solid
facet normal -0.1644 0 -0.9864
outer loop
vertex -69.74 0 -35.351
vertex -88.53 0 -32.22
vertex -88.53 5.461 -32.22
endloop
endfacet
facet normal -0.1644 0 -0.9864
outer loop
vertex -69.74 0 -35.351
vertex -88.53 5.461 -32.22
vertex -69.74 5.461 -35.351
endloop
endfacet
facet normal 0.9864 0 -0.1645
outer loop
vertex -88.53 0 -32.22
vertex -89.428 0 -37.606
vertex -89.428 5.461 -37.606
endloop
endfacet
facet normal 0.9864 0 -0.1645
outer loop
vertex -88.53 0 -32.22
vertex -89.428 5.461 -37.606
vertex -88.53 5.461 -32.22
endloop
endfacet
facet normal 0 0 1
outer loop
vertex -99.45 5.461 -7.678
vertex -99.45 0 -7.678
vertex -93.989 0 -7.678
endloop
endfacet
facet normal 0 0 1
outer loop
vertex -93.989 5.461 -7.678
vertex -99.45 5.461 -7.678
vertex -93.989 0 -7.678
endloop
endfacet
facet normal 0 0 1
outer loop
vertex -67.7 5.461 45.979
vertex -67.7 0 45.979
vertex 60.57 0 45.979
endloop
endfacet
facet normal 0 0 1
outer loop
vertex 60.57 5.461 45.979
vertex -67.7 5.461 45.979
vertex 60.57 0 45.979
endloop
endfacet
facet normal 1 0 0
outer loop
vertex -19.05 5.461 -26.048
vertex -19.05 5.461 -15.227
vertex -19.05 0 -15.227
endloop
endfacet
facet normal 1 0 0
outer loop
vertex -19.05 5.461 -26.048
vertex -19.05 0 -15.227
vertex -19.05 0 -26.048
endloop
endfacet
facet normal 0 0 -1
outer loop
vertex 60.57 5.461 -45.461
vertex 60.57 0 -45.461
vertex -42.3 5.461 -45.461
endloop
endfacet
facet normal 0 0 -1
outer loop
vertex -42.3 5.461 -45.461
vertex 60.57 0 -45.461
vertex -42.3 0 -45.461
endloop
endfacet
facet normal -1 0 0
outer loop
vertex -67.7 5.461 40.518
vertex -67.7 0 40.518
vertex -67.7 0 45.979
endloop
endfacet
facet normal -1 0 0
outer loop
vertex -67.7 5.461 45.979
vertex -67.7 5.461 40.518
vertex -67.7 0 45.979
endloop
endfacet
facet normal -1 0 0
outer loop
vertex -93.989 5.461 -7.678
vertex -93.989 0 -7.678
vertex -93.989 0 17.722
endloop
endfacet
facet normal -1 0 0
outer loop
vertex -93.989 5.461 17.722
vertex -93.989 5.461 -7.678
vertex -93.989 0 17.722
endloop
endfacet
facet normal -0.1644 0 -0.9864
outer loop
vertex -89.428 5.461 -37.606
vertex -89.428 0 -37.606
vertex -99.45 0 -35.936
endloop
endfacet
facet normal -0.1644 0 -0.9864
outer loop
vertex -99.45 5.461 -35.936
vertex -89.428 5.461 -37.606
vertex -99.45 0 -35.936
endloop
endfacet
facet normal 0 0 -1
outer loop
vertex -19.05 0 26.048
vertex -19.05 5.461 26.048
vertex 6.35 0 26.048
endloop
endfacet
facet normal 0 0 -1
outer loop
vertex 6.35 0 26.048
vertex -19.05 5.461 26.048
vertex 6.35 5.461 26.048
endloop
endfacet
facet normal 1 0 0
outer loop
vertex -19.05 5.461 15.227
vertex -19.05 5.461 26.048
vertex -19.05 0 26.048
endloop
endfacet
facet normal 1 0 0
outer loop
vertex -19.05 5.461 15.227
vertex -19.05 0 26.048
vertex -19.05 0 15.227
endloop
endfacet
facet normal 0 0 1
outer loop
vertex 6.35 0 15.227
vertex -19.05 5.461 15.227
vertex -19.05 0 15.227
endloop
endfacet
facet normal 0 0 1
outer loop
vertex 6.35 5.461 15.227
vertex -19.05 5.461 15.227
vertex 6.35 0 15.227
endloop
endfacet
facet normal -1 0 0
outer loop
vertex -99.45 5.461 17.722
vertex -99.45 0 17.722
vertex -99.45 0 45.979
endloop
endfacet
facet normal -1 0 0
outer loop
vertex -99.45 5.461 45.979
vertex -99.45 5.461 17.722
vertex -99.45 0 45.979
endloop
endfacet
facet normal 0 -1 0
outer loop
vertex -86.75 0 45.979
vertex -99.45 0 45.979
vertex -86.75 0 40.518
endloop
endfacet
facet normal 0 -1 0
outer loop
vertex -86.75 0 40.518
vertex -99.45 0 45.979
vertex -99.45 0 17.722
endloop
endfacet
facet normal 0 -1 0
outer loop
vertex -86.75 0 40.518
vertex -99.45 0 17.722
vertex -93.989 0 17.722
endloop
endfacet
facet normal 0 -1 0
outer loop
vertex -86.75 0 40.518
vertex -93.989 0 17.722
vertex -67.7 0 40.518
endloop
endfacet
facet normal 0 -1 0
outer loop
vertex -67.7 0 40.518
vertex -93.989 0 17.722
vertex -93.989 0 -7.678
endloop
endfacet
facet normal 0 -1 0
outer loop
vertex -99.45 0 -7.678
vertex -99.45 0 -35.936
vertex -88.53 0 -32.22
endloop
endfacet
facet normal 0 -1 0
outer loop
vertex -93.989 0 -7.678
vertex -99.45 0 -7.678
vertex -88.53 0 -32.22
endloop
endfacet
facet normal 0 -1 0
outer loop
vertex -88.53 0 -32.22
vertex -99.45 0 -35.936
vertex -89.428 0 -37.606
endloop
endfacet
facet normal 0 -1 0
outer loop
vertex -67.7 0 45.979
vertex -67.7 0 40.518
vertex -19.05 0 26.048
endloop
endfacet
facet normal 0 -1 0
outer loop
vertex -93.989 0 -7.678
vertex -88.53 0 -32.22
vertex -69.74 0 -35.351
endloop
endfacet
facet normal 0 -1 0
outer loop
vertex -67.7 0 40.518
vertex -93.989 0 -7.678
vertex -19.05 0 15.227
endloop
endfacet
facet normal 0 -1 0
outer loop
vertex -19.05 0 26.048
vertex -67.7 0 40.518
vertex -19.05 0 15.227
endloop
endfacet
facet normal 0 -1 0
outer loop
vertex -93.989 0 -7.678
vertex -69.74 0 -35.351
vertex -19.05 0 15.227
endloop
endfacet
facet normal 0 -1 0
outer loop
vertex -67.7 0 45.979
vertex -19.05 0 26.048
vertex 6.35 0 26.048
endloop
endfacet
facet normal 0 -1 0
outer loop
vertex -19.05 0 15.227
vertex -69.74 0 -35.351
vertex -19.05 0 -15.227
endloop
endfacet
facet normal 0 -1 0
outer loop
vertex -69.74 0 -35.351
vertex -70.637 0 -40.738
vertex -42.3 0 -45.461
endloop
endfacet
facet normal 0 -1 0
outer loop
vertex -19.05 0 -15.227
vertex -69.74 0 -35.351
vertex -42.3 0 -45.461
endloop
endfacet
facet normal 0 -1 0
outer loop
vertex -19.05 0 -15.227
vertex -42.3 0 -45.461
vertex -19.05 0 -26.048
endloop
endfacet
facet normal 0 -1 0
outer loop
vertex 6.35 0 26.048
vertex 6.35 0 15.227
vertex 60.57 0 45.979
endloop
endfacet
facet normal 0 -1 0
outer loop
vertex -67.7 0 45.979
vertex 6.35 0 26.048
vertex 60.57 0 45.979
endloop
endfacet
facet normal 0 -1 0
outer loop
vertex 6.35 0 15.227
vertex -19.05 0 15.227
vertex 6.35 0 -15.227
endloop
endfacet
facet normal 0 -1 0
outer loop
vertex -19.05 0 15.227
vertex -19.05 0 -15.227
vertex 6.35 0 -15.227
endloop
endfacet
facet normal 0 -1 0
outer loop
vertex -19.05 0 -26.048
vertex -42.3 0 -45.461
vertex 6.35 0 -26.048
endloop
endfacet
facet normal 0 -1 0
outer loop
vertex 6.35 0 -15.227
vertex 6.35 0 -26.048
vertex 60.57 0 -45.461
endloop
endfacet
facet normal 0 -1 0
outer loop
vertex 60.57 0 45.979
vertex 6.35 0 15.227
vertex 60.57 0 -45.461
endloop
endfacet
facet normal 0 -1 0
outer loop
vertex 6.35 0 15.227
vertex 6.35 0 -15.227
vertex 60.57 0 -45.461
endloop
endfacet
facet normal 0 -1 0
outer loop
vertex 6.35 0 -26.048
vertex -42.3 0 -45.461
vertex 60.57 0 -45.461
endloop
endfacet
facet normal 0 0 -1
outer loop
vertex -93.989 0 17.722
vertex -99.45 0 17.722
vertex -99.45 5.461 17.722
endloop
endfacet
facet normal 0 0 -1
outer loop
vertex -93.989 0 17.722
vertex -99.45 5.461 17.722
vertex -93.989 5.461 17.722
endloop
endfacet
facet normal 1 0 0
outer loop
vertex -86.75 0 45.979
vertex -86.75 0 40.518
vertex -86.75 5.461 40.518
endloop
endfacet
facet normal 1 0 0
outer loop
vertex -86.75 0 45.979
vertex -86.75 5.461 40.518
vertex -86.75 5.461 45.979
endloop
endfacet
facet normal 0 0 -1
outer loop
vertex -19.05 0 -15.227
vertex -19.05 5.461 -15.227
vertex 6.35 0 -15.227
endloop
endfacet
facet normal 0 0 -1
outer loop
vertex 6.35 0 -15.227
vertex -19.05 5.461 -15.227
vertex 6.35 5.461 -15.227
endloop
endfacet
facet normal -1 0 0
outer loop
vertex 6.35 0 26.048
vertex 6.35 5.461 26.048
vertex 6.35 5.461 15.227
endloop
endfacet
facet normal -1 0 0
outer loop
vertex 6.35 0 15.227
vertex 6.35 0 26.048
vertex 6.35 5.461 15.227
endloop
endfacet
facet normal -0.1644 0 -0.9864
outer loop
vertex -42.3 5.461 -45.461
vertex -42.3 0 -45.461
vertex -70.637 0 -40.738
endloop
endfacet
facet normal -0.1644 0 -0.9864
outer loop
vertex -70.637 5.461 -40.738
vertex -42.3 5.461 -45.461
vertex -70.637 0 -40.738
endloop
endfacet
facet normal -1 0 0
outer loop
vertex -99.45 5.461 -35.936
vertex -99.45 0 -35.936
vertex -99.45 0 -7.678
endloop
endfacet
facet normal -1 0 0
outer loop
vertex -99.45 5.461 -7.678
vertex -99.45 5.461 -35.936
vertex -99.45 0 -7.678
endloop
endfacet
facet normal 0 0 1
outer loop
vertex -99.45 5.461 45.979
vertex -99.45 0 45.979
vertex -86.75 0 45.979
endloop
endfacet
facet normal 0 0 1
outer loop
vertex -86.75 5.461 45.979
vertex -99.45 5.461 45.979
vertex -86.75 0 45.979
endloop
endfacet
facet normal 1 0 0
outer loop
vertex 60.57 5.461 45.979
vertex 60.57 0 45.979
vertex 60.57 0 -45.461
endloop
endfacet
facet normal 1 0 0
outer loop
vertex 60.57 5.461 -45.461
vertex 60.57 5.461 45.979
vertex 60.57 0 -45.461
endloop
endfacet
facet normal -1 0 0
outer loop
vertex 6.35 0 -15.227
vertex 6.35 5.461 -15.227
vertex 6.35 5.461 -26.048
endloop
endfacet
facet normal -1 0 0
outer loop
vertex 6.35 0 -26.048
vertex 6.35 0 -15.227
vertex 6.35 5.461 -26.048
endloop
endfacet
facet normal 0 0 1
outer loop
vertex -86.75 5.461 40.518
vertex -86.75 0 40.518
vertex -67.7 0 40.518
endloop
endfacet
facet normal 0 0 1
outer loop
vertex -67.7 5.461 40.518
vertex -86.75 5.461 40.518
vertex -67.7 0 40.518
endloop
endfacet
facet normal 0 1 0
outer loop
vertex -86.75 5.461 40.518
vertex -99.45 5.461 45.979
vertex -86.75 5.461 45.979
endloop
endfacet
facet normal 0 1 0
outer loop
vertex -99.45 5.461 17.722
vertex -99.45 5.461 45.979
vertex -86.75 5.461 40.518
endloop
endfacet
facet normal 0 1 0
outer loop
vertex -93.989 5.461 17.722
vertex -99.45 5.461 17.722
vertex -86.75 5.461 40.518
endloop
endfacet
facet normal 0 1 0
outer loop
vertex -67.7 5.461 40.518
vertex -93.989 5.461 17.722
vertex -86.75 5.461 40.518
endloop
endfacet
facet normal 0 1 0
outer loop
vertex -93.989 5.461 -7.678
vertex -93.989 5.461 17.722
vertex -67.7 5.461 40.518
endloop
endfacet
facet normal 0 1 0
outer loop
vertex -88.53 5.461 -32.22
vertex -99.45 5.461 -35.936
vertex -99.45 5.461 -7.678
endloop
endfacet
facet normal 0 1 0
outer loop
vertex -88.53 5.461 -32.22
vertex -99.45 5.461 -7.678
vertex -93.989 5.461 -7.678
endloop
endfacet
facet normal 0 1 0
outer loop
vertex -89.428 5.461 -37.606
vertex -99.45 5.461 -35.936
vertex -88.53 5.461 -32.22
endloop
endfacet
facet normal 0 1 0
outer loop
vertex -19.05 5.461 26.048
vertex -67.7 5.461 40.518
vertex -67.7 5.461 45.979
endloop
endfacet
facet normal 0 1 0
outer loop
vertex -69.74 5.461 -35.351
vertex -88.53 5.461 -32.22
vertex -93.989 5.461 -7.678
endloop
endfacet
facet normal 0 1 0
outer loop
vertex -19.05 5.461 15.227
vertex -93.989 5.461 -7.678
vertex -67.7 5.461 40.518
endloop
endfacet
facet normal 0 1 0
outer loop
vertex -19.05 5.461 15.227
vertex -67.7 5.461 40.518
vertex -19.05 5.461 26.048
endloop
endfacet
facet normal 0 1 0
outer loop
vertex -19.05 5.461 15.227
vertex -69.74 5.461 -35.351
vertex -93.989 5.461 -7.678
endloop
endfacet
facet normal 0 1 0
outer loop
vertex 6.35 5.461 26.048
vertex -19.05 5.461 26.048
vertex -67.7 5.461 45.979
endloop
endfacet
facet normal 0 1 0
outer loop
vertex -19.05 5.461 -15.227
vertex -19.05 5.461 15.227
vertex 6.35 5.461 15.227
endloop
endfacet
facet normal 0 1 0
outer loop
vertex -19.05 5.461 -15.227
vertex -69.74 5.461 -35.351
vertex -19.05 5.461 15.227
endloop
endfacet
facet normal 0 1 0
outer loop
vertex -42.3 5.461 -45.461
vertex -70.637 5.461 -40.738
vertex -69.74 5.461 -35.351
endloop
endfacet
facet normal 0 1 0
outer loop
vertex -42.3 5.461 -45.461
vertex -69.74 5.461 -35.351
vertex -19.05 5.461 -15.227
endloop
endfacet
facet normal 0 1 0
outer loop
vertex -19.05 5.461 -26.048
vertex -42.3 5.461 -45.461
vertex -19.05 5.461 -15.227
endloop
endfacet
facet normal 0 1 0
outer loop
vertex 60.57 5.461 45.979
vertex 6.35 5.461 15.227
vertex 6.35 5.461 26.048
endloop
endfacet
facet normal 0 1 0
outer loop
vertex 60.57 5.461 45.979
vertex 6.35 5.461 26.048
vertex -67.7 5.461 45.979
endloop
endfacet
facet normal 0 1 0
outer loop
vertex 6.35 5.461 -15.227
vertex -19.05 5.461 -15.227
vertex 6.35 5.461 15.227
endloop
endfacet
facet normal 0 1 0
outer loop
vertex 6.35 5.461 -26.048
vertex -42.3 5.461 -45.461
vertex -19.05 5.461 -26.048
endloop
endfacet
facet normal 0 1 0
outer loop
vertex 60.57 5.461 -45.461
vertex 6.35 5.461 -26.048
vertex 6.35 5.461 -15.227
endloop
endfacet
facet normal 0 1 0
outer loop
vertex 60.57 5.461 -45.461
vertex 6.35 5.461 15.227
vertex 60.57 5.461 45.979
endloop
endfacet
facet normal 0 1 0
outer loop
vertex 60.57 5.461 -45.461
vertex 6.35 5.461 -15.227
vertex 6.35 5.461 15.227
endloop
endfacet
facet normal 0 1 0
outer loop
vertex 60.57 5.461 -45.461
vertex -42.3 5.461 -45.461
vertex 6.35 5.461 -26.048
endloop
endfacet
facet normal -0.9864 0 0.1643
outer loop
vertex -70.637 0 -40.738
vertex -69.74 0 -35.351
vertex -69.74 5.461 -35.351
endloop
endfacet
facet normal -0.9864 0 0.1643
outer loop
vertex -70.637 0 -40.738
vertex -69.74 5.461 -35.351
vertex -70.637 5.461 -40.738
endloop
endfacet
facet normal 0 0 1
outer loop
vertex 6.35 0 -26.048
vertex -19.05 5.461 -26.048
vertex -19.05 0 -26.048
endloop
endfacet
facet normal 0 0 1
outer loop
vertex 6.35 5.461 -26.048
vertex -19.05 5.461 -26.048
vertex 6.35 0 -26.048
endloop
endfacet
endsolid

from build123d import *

# Parameters (mm, degrees)
BOSS_EXTRUDE1_DEPTH = 5.461
BOSS_EXTRUDE2_DEPTH = 5.461
SKETCH3_W           = 5.461
SKETCH3_H           = 25.4
SKETCH3_W_2         = 19.05
SKETCH3_H_2         = 5.461
CUT_EXTRUDE1_DEPTH  = 6.461
SKETCH4_W           = 25.4
SKETCH4_H           = 10.8204
CUT_EXTRUDE2_DEPTH  = 6.461


with BuildPart() as part:
    # Sketch1 → Boss-Extrude1 (new body)
    with BuildSketch(Plane(origin=(0, 0, 0), x_dir=(1, 0, 0), z_dir=(0, 1, 0))):
        Polygon((-42.3, 45.461), (-99.45, 35.936), (-99.45, -45.979), (60.57, -45.979), (60.57, 45.461), align=None)
        with BuildLine():
            ThreePointArc((-55, 32.5), (-52.803300859, 37.803300859), (-47.5, 40))
            Line((-47.5, 40), (47.5, 40))
            ThreePointArc((47.5, 40), (52.803300859, 37.803300859), (55, 32.5))
            Line((55, 32.5), (55, -32.5))
            ThreePointArc((55, -32.5), (52.803300859, -37.803300859), (47.5, -40))
            Line((47.5, -40), (-47.5, -40))
            ThreePointArc((-47.5, -40), (-52.803300859, -37.803300859), (-55, -32.5))
            Line((-55, -32.5), (-55, 32.5))
        make_face(mode=Mode.SUBTRACT)
    extrude(amount=BOSS_EXTRUDE1_DEPTH)

    # Sketch2 → Boss-Extrude2 (add)
    with BuildSketch(Plane(origin=(0, 5.461, 0), x_dir=(1, 0, 0), z_dir=(0, 1, 0))):
        with BuildLine():
            Line((-47.5, -40), (47.5, -40))
            ThreePointArc((47.5, -40), (52.803300859, -37.803300859), (55, -32.5))
            Line((55, -32.5), (55, 32.5))
            ThreePointArc((55, 32.5), (52.803300859, 37.803300859), (47.5, 40))
            Line((47.5, 40), (-47.5, 40))
            ThreePointArc((-47.5, 40), (-52.803300859, 37.803300859), (-55, 32.5))
            Line((-55, 32.5), (-55, -32.5))
            ThreePointArc((-55, -32.5), (-52.803300859, -37.803300859), (-47.5, -40))
        make_face()
    extrude(amount=-BOSS_EXTRUDE2_DEPTH)

    # Sketch3 → Cut-Extrude1 (cut, through all)
    with BuildSketch(Plane.XZ):
        Polygon((-70.637433485, -40.738094419), (-89.428237734, -37.606293711), (-88.530454864, -32.219596493), (-69.739650615, -35.351397201), align=None)
        with Locations((-96.7195, 5.0215)):
            Rectangle(SKETCH3_W, SKETCH3_H)
        with Locations((-77.225, 43.2485)):
            Rectangle(SKETCH3_W_2, SKETCH3_H_2)
    extrude(amount=-CUT_EXTRUDE1_DEPTH, mode=Mode.SUBTRACT)

    # Sketch4 → Cut-Extrude2 (cut, through all)
    with BuildSketch(Plane(origin=(0, 5.461, 0), x_dir=(1, 0, 0), z_dir=(0, 1, 0))):
        with Locations((-6.35, -20.6375)):
            Rectangle(SKETCH4_W, SKETCH4_H)
        with Locations((-6.35, 20.6375)):
            Rectangle(SKETCH4_W, SKETCH4_H)
    extrude(amount=-CUT_EXTRUDE2_DEPTH, mode=Mode.SUBTRACT)


solid = part.part
